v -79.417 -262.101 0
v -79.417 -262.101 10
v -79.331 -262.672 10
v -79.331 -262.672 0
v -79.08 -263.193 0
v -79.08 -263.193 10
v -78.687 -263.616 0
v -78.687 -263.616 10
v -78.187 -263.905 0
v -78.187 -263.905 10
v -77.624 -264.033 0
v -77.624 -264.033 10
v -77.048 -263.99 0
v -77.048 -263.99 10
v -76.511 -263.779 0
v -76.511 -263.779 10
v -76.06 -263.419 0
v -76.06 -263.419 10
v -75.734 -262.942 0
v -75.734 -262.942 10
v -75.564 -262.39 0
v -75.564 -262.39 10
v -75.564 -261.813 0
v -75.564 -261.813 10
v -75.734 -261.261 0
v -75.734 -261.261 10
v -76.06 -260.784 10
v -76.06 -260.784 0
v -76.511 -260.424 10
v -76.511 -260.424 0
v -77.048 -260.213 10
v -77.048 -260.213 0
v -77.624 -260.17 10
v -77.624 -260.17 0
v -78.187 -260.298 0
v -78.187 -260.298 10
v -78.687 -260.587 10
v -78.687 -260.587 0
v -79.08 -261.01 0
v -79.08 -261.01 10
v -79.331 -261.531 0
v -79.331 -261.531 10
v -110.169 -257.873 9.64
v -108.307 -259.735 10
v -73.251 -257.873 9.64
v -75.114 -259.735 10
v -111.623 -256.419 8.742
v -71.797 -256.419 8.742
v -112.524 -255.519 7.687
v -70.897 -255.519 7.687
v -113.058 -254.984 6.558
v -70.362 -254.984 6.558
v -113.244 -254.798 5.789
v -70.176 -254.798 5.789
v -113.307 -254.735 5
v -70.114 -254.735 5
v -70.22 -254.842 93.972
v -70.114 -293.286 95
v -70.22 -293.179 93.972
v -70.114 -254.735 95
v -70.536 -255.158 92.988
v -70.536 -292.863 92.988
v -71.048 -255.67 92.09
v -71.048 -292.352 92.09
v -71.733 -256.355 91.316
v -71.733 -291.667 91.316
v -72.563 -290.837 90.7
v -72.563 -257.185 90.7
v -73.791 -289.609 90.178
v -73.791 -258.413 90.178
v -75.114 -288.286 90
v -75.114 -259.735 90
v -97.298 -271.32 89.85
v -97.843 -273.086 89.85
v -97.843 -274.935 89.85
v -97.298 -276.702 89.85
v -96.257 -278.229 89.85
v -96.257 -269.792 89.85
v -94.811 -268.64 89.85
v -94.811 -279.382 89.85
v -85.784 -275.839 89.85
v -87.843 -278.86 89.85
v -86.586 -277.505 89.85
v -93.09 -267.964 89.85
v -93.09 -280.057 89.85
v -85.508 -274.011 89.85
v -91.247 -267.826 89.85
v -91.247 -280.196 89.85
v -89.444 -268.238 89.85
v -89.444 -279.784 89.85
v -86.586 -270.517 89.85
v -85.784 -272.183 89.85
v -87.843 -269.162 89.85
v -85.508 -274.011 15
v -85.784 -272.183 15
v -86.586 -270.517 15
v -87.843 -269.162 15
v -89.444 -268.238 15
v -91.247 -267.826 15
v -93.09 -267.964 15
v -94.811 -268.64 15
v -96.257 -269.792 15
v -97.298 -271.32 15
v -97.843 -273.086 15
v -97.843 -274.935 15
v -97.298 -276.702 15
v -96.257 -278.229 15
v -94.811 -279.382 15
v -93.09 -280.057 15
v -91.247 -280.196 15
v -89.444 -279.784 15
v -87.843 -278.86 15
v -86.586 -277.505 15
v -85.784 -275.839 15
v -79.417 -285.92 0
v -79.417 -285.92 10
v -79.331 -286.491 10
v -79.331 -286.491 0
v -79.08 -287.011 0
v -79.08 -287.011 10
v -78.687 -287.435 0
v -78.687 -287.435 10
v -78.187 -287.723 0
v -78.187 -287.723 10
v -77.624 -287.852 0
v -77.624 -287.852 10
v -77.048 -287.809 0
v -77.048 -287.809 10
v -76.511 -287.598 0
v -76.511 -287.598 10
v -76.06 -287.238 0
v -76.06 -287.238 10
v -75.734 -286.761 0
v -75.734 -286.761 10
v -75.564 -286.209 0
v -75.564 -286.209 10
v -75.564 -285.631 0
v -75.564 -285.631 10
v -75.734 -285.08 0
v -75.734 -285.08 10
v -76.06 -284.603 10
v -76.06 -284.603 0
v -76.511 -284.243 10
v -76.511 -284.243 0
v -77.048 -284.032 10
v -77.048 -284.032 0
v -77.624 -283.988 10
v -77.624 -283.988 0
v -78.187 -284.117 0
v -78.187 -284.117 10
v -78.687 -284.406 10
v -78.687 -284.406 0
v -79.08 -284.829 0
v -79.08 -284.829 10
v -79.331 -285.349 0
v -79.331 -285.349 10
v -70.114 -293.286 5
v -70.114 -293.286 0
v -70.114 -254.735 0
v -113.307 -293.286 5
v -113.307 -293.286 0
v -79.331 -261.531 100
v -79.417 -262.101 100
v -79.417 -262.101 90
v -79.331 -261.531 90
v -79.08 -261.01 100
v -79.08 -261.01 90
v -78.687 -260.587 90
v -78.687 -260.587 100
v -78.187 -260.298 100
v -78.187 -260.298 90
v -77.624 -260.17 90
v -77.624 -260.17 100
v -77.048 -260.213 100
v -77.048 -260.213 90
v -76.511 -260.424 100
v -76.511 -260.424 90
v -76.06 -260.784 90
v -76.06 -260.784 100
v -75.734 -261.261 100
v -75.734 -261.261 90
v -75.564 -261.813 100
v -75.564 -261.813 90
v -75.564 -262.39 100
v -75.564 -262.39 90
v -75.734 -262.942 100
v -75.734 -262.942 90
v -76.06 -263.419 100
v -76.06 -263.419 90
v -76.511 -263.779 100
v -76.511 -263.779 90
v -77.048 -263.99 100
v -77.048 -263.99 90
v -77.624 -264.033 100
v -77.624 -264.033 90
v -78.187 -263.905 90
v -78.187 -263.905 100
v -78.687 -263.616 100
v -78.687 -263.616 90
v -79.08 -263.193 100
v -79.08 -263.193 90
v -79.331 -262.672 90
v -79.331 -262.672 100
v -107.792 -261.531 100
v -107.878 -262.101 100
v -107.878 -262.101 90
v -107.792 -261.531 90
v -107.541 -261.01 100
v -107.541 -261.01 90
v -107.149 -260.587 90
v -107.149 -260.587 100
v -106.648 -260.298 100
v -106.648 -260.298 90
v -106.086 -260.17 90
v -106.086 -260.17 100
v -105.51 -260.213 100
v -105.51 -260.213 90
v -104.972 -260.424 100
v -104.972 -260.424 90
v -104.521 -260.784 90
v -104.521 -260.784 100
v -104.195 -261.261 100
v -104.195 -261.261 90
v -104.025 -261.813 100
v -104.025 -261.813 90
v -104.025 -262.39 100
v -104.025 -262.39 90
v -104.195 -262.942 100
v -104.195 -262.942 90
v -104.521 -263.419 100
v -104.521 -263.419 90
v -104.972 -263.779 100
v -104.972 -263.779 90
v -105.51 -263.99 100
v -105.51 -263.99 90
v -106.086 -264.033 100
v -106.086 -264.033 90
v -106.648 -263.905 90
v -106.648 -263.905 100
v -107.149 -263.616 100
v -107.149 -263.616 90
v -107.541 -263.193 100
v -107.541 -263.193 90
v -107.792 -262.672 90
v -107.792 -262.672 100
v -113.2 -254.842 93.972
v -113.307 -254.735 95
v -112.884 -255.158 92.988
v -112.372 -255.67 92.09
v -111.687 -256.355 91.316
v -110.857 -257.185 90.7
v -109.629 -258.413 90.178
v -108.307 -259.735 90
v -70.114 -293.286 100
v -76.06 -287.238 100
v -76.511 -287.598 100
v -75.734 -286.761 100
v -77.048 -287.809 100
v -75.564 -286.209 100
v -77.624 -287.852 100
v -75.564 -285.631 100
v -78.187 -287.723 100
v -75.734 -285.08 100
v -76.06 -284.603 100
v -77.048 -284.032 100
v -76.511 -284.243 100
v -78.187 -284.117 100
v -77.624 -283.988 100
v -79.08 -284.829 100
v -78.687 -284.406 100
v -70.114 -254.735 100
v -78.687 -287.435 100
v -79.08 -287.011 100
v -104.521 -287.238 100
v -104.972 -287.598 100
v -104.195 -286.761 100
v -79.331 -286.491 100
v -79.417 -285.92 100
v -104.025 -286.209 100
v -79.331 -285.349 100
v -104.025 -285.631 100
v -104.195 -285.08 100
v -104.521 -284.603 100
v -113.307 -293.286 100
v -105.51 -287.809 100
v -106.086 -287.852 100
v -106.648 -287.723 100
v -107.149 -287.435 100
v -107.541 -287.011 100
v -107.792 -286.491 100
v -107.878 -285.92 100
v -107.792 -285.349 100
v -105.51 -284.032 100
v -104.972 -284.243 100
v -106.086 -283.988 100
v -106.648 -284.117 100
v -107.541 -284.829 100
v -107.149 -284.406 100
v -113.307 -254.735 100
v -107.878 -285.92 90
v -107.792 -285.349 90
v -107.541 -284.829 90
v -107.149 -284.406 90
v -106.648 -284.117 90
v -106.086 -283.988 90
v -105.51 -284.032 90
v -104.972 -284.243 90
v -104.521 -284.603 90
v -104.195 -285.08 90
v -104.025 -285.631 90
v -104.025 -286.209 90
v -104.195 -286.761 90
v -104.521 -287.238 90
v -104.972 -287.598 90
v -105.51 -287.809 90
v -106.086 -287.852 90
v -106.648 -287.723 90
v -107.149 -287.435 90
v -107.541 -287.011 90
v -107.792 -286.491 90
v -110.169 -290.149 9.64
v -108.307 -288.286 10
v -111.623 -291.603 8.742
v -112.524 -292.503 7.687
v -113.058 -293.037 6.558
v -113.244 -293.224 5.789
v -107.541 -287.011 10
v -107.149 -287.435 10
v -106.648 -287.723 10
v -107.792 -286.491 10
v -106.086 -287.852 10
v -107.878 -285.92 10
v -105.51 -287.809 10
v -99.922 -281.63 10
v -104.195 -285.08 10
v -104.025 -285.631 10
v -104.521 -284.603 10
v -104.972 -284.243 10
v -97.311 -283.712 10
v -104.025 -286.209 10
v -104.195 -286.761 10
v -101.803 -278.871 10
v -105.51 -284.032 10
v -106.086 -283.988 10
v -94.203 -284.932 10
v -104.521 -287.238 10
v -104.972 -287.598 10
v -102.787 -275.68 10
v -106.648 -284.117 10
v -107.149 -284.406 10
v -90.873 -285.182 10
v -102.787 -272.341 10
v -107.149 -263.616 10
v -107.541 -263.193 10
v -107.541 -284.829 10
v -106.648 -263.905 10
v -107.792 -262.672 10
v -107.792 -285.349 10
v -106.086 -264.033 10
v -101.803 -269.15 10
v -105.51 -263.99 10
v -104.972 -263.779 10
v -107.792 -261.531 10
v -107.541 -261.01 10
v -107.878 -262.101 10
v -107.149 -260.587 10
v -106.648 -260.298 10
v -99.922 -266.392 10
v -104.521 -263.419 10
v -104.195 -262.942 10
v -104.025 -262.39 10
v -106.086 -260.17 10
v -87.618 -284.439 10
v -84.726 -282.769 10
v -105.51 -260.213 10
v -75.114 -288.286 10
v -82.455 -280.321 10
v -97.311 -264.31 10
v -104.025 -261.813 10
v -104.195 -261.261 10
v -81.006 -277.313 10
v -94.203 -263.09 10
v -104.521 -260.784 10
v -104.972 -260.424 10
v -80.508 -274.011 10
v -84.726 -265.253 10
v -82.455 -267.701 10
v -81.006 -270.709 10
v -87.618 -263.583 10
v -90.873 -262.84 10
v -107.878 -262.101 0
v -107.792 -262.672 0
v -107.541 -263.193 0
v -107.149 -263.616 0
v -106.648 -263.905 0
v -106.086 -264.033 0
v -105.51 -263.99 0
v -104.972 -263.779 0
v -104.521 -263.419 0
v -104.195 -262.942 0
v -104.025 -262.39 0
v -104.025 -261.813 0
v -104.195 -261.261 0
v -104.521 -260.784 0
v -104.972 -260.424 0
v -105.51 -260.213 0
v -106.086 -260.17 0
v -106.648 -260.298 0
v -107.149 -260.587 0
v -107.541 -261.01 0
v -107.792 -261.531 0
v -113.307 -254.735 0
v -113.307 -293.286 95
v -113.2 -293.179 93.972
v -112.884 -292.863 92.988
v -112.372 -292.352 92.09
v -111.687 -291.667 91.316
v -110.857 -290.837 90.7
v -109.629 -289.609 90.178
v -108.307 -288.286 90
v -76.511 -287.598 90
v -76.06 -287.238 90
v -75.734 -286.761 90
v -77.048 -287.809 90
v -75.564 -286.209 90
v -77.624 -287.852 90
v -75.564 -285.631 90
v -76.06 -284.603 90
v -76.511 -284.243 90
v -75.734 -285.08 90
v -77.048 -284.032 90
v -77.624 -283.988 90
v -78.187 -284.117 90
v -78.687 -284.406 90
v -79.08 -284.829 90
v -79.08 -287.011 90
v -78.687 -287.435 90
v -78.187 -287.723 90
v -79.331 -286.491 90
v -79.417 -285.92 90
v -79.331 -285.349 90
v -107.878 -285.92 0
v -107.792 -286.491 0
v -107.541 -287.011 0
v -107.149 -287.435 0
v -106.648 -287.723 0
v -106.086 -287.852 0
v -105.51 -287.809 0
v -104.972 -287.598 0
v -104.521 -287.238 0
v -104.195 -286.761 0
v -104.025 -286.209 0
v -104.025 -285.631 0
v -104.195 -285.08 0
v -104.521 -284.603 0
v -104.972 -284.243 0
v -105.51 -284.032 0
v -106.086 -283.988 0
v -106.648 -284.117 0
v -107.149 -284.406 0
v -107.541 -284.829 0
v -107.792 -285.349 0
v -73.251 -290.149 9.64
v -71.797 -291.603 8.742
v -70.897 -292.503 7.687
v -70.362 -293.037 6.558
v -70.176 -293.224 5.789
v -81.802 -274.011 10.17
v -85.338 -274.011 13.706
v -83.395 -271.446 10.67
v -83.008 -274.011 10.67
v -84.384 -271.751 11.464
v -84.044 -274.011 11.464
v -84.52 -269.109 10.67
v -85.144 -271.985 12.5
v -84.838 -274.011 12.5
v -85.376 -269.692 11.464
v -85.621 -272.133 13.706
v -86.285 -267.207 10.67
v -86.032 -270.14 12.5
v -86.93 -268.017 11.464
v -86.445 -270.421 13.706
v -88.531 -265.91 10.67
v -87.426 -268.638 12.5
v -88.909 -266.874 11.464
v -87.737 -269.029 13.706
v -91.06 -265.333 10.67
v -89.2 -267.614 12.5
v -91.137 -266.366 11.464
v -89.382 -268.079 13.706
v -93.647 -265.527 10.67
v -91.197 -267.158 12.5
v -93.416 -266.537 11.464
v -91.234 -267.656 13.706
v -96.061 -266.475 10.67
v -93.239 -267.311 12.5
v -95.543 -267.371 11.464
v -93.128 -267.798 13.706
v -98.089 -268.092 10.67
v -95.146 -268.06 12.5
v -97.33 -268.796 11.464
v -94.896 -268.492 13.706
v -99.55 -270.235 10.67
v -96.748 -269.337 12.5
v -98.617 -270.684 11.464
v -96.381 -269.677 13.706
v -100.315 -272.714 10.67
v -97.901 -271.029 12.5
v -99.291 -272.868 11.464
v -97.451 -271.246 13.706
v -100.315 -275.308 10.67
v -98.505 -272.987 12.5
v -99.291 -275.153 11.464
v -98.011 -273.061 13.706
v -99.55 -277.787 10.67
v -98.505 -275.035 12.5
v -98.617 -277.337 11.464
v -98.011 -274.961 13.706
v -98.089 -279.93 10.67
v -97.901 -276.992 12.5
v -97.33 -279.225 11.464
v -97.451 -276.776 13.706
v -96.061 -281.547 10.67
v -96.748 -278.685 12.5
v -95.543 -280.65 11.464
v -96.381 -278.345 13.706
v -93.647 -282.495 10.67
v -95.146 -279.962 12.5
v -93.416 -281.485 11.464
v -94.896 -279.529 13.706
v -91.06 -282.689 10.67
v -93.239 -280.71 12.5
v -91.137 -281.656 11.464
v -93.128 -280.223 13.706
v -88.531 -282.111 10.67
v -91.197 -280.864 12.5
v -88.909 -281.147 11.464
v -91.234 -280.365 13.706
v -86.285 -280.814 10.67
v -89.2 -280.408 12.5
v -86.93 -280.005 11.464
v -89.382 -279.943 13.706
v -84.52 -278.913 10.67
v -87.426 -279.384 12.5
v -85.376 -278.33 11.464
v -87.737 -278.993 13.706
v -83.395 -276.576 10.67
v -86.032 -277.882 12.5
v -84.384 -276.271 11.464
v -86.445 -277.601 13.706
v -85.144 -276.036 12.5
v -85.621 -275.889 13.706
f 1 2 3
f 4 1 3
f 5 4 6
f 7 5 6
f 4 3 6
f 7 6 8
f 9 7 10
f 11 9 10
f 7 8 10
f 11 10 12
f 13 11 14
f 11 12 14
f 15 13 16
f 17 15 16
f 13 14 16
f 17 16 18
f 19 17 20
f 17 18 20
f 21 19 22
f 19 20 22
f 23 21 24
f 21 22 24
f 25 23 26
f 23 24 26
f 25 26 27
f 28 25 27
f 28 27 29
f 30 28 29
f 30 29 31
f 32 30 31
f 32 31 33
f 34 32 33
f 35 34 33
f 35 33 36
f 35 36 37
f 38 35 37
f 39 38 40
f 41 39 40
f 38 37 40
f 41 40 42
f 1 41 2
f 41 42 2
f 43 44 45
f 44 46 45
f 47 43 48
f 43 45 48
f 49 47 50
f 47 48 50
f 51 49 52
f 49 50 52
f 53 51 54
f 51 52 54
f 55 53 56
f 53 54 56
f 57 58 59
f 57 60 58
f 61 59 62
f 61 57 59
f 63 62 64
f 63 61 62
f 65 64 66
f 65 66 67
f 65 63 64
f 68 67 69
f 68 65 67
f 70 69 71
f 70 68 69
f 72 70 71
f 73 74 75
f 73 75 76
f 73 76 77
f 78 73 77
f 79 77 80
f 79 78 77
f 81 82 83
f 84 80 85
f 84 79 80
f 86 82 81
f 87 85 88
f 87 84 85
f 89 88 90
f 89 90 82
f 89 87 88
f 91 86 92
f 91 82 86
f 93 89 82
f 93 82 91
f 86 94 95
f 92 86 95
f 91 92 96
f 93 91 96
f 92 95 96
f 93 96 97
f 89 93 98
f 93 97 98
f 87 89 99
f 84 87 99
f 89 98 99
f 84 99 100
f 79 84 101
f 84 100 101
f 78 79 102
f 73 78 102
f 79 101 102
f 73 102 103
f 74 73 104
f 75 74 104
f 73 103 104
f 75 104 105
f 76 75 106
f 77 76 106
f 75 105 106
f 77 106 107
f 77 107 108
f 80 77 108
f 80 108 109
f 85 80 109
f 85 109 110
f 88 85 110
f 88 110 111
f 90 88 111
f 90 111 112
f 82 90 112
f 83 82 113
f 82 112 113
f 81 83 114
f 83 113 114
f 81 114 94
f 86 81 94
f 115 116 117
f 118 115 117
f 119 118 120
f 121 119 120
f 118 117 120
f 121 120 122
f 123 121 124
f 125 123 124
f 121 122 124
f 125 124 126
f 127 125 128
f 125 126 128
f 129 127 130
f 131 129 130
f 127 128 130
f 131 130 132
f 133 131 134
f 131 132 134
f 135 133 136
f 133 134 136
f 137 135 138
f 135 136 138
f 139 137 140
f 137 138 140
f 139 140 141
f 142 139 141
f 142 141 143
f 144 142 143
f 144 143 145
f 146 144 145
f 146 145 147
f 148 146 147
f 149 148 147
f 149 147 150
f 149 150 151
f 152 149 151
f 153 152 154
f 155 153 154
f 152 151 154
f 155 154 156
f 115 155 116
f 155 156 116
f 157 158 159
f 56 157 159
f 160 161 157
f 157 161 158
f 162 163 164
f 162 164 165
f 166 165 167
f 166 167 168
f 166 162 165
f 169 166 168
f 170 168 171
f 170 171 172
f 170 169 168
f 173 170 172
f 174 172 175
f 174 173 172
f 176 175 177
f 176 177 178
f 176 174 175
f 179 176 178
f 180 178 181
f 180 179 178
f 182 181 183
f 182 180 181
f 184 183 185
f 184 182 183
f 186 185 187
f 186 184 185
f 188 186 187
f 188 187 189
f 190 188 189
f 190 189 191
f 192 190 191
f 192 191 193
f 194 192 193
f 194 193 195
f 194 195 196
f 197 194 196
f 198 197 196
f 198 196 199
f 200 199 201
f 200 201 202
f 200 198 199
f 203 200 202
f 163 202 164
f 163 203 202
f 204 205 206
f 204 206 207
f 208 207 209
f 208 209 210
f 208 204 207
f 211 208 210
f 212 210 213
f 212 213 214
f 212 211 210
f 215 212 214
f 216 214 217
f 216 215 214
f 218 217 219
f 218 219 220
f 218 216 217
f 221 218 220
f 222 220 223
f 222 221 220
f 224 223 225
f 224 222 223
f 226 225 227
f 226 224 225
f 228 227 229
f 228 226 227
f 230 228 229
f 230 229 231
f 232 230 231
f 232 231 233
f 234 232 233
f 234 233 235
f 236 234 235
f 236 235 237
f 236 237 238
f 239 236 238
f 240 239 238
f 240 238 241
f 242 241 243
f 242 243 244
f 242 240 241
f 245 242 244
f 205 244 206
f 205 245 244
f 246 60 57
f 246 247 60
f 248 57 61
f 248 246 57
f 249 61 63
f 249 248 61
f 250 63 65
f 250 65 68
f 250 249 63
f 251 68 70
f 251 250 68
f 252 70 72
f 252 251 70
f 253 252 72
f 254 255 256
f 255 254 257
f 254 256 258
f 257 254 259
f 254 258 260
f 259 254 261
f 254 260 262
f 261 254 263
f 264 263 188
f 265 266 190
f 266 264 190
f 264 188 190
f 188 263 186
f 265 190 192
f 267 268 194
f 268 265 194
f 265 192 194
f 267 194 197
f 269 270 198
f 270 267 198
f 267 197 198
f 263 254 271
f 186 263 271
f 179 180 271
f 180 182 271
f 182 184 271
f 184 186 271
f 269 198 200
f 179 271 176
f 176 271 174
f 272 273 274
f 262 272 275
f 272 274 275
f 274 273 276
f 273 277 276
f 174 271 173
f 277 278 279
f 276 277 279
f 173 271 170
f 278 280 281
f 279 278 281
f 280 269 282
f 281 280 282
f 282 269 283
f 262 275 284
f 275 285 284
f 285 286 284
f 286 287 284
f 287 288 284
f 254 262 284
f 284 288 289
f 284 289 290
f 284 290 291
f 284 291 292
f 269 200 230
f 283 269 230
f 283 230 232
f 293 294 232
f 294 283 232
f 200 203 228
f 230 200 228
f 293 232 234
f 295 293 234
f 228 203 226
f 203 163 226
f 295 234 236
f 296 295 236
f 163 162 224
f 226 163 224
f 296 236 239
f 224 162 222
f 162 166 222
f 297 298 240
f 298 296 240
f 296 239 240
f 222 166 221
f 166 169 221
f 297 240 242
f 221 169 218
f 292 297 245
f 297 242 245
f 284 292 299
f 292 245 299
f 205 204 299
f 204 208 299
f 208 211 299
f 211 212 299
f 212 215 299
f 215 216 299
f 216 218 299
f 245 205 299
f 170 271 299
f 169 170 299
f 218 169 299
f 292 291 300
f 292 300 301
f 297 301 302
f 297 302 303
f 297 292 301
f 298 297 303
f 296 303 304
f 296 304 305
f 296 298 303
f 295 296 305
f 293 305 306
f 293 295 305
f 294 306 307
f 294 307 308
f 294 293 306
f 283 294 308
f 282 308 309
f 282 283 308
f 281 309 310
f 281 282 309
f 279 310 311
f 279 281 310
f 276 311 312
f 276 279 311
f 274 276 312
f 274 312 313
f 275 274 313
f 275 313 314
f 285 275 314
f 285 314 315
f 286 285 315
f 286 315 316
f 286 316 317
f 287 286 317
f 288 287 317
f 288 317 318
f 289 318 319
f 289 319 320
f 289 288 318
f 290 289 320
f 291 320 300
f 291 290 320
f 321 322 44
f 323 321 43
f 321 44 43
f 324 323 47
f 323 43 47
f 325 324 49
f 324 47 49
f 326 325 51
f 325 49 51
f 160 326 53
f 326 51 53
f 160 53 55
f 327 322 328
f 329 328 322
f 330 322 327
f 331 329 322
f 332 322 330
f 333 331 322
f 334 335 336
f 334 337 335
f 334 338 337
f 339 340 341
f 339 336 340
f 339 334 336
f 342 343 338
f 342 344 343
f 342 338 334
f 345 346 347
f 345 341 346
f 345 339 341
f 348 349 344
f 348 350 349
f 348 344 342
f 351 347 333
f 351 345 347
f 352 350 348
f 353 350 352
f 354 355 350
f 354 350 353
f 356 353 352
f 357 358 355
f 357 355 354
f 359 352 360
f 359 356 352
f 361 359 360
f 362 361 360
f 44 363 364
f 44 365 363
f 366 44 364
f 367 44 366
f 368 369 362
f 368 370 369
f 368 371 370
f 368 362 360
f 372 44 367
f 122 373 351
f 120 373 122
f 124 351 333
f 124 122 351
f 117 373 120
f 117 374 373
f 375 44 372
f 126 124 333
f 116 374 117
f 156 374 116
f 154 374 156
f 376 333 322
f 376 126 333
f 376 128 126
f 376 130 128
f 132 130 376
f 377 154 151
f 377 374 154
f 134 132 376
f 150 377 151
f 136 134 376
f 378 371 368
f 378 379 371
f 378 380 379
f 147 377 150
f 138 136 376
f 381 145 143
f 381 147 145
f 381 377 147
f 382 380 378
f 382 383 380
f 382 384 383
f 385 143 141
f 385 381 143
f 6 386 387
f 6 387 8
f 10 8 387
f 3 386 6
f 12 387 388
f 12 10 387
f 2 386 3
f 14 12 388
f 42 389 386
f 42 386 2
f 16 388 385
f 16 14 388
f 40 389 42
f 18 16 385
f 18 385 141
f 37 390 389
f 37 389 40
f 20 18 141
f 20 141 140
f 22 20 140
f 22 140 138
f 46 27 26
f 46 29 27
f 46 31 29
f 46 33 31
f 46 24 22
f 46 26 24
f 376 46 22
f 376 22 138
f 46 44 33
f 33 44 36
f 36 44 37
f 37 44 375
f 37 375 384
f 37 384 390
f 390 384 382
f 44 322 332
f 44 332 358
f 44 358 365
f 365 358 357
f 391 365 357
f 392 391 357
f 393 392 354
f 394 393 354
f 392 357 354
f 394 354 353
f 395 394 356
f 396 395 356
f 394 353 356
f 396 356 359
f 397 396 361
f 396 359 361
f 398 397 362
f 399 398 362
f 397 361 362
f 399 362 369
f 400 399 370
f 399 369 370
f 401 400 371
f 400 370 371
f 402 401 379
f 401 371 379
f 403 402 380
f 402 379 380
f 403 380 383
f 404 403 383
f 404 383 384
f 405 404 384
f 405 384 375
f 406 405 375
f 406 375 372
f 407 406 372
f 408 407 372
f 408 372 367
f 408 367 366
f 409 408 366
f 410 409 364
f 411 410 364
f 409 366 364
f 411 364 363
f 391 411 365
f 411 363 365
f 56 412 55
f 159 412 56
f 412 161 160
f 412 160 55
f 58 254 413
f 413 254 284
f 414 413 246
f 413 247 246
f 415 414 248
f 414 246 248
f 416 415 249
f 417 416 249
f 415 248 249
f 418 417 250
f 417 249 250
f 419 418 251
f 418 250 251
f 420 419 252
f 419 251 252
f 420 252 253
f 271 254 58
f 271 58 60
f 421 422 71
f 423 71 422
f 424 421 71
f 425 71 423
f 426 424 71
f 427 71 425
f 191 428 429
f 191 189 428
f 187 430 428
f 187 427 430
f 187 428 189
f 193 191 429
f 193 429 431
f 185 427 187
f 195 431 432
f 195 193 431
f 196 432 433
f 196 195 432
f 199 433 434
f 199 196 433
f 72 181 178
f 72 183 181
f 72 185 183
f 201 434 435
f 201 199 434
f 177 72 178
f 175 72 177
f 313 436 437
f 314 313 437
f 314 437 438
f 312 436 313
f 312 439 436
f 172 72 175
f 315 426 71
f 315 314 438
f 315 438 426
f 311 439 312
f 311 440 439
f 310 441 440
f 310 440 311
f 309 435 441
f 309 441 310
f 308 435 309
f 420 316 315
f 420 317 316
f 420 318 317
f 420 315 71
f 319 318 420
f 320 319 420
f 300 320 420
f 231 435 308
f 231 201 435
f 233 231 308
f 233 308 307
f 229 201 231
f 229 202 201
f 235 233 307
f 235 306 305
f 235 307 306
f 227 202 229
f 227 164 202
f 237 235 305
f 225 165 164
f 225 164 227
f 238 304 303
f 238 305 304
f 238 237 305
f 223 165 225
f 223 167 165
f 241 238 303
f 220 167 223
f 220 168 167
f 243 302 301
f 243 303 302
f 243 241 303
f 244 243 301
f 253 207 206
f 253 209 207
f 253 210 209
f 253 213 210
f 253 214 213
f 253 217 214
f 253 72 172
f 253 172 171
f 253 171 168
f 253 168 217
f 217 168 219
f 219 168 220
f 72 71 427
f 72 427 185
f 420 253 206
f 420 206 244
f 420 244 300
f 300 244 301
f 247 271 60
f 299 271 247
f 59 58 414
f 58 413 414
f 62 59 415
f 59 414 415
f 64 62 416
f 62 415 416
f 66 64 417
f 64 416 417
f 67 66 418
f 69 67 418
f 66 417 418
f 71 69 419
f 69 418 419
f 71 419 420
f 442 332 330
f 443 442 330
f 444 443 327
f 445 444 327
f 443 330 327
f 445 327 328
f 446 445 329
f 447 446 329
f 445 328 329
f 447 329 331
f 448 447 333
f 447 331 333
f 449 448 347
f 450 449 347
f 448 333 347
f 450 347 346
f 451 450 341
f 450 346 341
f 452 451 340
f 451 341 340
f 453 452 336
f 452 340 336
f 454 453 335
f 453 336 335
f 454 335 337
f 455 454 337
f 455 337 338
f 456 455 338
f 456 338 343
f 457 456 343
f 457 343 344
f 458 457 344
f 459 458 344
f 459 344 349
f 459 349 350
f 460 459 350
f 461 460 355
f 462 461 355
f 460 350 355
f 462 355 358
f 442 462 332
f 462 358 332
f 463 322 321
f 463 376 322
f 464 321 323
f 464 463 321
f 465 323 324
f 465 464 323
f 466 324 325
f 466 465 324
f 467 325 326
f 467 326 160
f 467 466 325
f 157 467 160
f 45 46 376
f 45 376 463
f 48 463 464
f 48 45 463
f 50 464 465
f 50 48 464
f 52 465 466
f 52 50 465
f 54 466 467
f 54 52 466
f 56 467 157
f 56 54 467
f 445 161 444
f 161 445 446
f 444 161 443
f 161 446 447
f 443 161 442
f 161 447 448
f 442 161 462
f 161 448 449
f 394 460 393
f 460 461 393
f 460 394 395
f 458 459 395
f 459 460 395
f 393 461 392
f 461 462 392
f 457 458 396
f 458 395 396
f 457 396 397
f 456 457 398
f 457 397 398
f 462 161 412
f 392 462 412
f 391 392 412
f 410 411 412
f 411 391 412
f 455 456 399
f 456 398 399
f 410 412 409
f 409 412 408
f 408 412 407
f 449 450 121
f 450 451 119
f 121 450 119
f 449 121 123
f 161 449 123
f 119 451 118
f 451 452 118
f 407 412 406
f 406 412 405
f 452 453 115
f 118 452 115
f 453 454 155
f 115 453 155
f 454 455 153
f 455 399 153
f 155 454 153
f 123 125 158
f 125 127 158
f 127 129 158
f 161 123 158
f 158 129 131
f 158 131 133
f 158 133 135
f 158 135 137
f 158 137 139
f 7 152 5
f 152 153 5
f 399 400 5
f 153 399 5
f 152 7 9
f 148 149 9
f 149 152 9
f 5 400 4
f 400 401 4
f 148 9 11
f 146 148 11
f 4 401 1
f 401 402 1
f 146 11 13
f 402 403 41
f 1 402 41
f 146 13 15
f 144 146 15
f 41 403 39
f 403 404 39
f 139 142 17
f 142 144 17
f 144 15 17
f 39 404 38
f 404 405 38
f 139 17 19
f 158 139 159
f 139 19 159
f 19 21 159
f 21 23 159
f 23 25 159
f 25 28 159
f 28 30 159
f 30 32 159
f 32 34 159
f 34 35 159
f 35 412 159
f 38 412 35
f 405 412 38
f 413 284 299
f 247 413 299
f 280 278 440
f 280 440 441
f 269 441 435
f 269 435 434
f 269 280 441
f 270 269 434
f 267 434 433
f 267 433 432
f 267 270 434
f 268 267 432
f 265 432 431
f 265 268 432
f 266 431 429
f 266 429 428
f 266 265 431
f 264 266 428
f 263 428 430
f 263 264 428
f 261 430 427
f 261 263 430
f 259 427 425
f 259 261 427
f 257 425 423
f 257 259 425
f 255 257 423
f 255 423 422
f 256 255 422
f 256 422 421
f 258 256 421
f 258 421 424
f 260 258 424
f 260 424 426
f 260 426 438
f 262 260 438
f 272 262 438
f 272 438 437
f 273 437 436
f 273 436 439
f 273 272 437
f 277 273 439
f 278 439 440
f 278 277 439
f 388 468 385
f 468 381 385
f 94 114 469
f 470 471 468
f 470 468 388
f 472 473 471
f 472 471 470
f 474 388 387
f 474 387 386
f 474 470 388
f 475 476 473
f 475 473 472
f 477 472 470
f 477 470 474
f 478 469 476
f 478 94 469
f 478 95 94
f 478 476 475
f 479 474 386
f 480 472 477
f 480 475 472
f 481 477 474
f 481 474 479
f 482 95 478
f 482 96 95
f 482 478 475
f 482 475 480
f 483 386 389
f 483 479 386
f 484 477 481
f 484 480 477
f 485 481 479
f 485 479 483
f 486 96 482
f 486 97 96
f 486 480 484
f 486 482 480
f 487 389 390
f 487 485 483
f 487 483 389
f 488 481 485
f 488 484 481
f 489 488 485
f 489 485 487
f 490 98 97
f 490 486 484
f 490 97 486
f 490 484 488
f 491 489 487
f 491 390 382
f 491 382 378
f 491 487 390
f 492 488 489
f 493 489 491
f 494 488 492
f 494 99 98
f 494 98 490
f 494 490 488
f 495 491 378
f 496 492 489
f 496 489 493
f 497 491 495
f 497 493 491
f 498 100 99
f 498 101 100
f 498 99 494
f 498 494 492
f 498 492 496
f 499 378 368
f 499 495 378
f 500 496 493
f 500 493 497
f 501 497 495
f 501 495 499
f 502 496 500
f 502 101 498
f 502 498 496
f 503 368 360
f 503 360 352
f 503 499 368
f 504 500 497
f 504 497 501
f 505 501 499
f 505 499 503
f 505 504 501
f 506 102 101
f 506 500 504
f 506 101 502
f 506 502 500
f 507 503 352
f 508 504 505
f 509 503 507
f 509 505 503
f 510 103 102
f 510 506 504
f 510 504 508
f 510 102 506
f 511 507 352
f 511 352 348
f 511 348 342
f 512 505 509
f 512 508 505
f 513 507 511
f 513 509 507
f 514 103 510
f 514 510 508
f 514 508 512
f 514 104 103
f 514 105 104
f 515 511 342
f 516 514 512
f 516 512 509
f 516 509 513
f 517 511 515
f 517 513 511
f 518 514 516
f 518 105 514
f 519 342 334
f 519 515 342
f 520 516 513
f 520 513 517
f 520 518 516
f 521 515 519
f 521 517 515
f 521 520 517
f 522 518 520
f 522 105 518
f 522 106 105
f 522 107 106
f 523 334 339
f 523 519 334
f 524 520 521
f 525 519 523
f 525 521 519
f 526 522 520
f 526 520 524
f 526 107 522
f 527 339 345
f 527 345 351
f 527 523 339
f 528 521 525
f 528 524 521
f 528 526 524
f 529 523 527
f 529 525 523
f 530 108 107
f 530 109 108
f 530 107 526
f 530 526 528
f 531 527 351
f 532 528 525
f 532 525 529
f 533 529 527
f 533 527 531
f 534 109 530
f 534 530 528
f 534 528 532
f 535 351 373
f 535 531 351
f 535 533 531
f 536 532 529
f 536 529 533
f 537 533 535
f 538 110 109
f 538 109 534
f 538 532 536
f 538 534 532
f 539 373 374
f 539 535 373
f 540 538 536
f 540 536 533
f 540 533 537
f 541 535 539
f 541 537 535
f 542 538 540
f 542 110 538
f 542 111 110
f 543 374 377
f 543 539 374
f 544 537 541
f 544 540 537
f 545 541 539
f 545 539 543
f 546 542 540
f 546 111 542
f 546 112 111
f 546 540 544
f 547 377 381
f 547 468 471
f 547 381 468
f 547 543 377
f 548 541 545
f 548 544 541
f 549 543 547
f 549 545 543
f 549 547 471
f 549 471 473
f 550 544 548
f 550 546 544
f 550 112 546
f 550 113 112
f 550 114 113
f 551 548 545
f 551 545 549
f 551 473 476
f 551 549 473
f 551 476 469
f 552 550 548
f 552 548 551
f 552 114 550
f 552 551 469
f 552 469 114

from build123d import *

# Parameters (mm, degrees)
SKETCH1_W           = 43.193201396
SKETCH1_H           = 38.550718919
BOSS_EXTRUDE1_DEPTH = 10
SKETCH2_R           = 6.202002341
BOSS_EXTRUDE2_DEPTH = 79.85
SKETCH3_W           = 43.193201396
SKETCH3_H           = 38.550718919
BOSS_EXTRUDE3_DEPTH = 10
FILLET2_R           = 5
FILLET5_R           = 5
FILLET6_R           = 5
SKETCH5_R           = 1.937143187
CUT_EXTRUDE3_DEPTH  = 10
SKETCH4_R           = 1.937143187
CUT_EXTRUDE4_DEPTH  = 10


with BuildPart() as part:
    # Sketch1 → Boss-Extrude1 (new body)
    with BuildSketch(Plane.XY):
        with Locations((-91.710148042, -274.010852562)):
            Rectangle(SKETCH1_W, SKETCH1_H)
    extrude(amount=BOSS_EXTRUDE1_DEPTH)

    # Sketch2 → Boss-Extrude2 (add)
    with BuildSketch(Plane.XY.offset(10)):
        with Locations((-91.710148042, -274.010852562)):
            Circle(SKETCH2_R)
    extrude(amount=BOSS_EXTRUDE2_DEPTH)

    # Fillet2
    fillet2_edges = [part.edges().sort_by_distance(p)[0] for p in [
        (-97.912150383, -274.010852562, 10),
    ]]
    fillet(fillet2_edges, radius=FILLET2_R)

    # Fillet6
    fillet6_edges = [part.edges().sort_by_distance(p)[0] for p in [
        (-70.113547344, -274.010852562, 10),
        (-91.710148042, -254.735493102, 10),
        (-113.30674874, -274.010852562, 10),
        (-91.710148042, -293.286212021, 10),
    ]]
    fillet(fillet6_edges, radius=FILLET6_R)

    # Sketch4 → Cut-Extrude4 (cut)
    with BuildSketch(Plane.XY.offset(10)):
        with Locations(Location((-77.479547344, -285.920212021, 0), (0, 0, 180))):
            Circle(SKETCH4_R)
        with Locations(Location((-105.94074874, -285.920212021, 0), (0, 0, 180))):
            Circle(SKETCH4_R)
        with Locations(Location((-77.479547344, -262.101493102, 0), (0, 0, 180))):
            Circle(SKETCH4_R)
        with Locations(Location((-105.94074874, -262.101493102, 0), (0, 0, 180))):
            Circle(SKETCH4_R)
    extrude(amount=-CUT_EXTRUDE4_DEPTH, mode=Mode.SUBTRACT)


with BuildPart() as body_2:
    # Sketch3 → Boss-Extrude3 (new body)
    with BuildSketch(Plane(origin=(0, 0, 100), x_dir=(-1, 0, 0), z_dir=(0, 0, -1))):
        with Locations((91.710148042, -274.010852562)):
            Rectangle(SKETCH3_W, SKETCH3_H)
    extrude(amount=BOSS_EXTRUDE3_DEPTH)

    # Fillet5
    fillet5_edges = [body_2.edges().sort_by_distance(p)[0] for p in [
        (-91.710148042, -254.735493102, 90),
        (-70.113547344, -274.010852562, 90),
        (-91.710148042, -293.286212021, 90),
        (-113.30674874, -274.010852562, 90),
    ]]
    fillet(fillet5_edges, radius=FILLET5_R)

    # Sketch5 → Cut-Extrude3 (cut)
    with BuildSketch(Plane(origin=(0, 0, 100), x_dir=(-1, 0, 0), z_dir=(0, 0, -1))):
        with Locations((105.94074874, -285.920212021)):
            Circle(SKETCH5_R)
        with Locations((105.94074874, -262.101493102)):
            Circle(SKETCH5_R)
        with Locations((77.479547344, -262.101493102)):
            Circle(SKETCH5_R)
        with Locations((77.479547344, -285.920212021)):
            Circle(SKETCH5_R)
    extrude(amount=CUT_EXTRUDE3_DEPTH, mode=Mode.SUBTRACT)


solid = Compound([part.part, body_2.part])
